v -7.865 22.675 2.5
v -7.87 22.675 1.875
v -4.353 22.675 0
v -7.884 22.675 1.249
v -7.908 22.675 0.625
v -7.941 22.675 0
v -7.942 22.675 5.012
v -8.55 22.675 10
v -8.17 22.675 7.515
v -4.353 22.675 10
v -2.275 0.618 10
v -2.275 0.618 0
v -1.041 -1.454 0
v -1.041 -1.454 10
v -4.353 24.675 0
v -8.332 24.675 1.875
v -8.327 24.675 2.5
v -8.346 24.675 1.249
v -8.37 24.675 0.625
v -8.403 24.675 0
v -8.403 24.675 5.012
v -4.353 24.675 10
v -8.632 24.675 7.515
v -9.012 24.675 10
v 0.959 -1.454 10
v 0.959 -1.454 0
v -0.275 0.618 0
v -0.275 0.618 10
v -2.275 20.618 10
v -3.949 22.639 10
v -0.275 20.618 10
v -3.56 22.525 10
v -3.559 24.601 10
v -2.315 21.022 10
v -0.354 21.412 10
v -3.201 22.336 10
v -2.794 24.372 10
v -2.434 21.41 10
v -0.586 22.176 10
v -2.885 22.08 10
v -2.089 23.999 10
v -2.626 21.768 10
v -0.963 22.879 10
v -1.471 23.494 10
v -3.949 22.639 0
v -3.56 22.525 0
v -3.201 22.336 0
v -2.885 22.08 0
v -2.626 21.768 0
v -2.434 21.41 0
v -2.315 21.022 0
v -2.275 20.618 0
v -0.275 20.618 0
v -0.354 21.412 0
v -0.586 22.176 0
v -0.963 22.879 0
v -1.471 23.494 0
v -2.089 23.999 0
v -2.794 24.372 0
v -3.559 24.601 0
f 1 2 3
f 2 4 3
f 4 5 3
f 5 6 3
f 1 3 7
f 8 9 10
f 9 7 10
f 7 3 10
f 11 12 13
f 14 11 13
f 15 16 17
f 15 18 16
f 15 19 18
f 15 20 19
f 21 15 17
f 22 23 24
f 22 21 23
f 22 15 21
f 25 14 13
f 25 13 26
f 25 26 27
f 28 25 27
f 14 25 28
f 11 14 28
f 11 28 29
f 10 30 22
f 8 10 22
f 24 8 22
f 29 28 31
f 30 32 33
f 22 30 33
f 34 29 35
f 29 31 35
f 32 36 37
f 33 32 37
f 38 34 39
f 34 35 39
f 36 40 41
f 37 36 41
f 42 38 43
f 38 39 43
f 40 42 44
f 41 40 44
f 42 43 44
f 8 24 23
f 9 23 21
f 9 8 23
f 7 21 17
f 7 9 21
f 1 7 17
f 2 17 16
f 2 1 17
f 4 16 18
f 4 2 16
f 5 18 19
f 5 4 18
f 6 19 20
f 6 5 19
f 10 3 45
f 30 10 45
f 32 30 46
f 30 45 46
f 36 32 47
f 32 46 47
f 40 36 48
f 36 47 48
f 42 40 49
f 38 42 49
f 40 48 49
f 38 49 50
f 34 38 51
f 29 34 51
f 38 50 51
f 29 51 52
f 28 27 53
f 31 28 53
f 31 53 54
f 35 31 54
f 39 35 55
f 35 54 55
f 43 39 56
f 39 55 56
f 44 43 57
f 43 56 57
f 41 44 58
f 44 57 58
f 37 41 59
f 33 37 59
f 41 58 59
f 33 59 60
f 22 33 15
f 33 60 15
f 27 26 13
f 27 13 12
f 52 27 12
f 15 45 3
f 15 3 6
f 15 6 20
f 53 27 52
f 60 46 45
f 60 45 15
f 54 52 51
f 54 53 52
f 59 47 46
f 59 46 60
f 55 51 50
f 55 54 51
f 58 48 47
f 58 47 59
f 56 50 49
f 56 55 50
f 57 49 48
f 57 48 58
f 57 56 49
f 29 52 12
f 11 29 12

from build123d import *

# Parameters (mm, degrees)
BOSS_EXTRUDE1_DEPTH     = 10
SKETCH2_W               = 10
SKETCH2_H               = 2.000056303
BOSS_EXTRUDE2_DEPTH     = 5
CUT_EXTRUDE3_DEPTH      = 11
BOSS_EXTRUDE7_DEPTH     = 10
SKETCH10_R              = 42.5
CUT_EXTRUDE5_DEPTH      = 2
CUT_EXTRUDE5_DEPTH_BACK = 2


with BuildPart() as part:
    # Sketch1 → Boss-Extrude1 (new body)
    with BuildSketch(Plane.XY):
        with BuildLine():
            Line((-0.275264024, 0.618336289), (-0.275264024, 20.618336289))
            ThreePointArc((-0.275264024, 20.618336289), (-1.471073772, 23.494405264), (-4.353490365, 24.674832426))
            Line((-4.353490365, 24.674832426), (-4.353490365, 22.674776123))
            ThreePointArc((-4.353490365, 22.674776123), (-2.885297366, 22.080181828), (-2.275264024, 20.618336289))
            Line((-2.275264024, 20.618336289), (-2.275264024, 0.618336289))
            Line((-2.275264024, 0.618336289), (-1.040586258, -1.454212886))
            Line((-1.040586258, -1.454212886), (0.959413742, -1.454212886))
            Line((0.959413742, -1.454212886), (-0.275264024, 0.618336289))
        make_face()
    extrude(amount=BOSS_EXTRUDE1_DEPTH)

    # Sketch2 → Boss-Extrude2 (add)
    with BuildSketch(Plane.ZY.offset(4.353490365)):
        with Locations((5, 23.674804275)):
            Rectangle(SKETCH2_W, SKETCH2_H)
    extrude(amount=BOSS_EXTRUDE2_DEPTH)

    # Sketch7 → Cut-Extrude3 (cut, through all)
    with BuildSketch(Plane.XY.offset(10)):
        with BuildLine():
            Line((-9.353490365, 24.674832426), (-8.891740984, 22.674776123))
            ThreePointArc((-8.891740984, 22.674776123), (-9.122615674, 22.648471274), (-9.353490365, 22.674776123))
            Line((-9.353490365, 22.674776123), (-9.353490365, 24.674832426))
        make_face()
    extrude(amount=-CUT_EXTRUDE3_DEPTH, mode=Mode.SUBTRACT)

    # Sketch8 → Boss-Extrude7 (add, through all)
    with BuildSketch(Plane.XY.offset(10)):
        Polygon((-9.122615674, 23.674804274), (-50.533343428, 14.114384465), (-50.555838533, 14.211821471), (-9.14511078, 23.772241281), align=None)
    extrude(amount=-BOSS_EXTRUDE7_DEPTH)

    # Sketch10 → Cut-Extrude5 (cut, two sides)
    with BuildSketch(Plane(origin=(-5.673302165, 24.573771456, 0), x_dir=(0.974370065, 0.224951054, 0), z_dir=(-0.224951054, 0.974370065, 0))) as cut_extrude5_sk:
        with Locations((-45.063131443, -2.5)):
            Circle(SKETCH10_R)
    extrude(amount=CUT_EXTRUDE5_DEPTH, mode=Mode.SUBTRACT)
    extrude(cut_extrude5_sk.sketch, amount=-CUT_EXTRUDE5_DEPTH_BACK, mode=Mode.SUBTRACT)


solid = part.part
